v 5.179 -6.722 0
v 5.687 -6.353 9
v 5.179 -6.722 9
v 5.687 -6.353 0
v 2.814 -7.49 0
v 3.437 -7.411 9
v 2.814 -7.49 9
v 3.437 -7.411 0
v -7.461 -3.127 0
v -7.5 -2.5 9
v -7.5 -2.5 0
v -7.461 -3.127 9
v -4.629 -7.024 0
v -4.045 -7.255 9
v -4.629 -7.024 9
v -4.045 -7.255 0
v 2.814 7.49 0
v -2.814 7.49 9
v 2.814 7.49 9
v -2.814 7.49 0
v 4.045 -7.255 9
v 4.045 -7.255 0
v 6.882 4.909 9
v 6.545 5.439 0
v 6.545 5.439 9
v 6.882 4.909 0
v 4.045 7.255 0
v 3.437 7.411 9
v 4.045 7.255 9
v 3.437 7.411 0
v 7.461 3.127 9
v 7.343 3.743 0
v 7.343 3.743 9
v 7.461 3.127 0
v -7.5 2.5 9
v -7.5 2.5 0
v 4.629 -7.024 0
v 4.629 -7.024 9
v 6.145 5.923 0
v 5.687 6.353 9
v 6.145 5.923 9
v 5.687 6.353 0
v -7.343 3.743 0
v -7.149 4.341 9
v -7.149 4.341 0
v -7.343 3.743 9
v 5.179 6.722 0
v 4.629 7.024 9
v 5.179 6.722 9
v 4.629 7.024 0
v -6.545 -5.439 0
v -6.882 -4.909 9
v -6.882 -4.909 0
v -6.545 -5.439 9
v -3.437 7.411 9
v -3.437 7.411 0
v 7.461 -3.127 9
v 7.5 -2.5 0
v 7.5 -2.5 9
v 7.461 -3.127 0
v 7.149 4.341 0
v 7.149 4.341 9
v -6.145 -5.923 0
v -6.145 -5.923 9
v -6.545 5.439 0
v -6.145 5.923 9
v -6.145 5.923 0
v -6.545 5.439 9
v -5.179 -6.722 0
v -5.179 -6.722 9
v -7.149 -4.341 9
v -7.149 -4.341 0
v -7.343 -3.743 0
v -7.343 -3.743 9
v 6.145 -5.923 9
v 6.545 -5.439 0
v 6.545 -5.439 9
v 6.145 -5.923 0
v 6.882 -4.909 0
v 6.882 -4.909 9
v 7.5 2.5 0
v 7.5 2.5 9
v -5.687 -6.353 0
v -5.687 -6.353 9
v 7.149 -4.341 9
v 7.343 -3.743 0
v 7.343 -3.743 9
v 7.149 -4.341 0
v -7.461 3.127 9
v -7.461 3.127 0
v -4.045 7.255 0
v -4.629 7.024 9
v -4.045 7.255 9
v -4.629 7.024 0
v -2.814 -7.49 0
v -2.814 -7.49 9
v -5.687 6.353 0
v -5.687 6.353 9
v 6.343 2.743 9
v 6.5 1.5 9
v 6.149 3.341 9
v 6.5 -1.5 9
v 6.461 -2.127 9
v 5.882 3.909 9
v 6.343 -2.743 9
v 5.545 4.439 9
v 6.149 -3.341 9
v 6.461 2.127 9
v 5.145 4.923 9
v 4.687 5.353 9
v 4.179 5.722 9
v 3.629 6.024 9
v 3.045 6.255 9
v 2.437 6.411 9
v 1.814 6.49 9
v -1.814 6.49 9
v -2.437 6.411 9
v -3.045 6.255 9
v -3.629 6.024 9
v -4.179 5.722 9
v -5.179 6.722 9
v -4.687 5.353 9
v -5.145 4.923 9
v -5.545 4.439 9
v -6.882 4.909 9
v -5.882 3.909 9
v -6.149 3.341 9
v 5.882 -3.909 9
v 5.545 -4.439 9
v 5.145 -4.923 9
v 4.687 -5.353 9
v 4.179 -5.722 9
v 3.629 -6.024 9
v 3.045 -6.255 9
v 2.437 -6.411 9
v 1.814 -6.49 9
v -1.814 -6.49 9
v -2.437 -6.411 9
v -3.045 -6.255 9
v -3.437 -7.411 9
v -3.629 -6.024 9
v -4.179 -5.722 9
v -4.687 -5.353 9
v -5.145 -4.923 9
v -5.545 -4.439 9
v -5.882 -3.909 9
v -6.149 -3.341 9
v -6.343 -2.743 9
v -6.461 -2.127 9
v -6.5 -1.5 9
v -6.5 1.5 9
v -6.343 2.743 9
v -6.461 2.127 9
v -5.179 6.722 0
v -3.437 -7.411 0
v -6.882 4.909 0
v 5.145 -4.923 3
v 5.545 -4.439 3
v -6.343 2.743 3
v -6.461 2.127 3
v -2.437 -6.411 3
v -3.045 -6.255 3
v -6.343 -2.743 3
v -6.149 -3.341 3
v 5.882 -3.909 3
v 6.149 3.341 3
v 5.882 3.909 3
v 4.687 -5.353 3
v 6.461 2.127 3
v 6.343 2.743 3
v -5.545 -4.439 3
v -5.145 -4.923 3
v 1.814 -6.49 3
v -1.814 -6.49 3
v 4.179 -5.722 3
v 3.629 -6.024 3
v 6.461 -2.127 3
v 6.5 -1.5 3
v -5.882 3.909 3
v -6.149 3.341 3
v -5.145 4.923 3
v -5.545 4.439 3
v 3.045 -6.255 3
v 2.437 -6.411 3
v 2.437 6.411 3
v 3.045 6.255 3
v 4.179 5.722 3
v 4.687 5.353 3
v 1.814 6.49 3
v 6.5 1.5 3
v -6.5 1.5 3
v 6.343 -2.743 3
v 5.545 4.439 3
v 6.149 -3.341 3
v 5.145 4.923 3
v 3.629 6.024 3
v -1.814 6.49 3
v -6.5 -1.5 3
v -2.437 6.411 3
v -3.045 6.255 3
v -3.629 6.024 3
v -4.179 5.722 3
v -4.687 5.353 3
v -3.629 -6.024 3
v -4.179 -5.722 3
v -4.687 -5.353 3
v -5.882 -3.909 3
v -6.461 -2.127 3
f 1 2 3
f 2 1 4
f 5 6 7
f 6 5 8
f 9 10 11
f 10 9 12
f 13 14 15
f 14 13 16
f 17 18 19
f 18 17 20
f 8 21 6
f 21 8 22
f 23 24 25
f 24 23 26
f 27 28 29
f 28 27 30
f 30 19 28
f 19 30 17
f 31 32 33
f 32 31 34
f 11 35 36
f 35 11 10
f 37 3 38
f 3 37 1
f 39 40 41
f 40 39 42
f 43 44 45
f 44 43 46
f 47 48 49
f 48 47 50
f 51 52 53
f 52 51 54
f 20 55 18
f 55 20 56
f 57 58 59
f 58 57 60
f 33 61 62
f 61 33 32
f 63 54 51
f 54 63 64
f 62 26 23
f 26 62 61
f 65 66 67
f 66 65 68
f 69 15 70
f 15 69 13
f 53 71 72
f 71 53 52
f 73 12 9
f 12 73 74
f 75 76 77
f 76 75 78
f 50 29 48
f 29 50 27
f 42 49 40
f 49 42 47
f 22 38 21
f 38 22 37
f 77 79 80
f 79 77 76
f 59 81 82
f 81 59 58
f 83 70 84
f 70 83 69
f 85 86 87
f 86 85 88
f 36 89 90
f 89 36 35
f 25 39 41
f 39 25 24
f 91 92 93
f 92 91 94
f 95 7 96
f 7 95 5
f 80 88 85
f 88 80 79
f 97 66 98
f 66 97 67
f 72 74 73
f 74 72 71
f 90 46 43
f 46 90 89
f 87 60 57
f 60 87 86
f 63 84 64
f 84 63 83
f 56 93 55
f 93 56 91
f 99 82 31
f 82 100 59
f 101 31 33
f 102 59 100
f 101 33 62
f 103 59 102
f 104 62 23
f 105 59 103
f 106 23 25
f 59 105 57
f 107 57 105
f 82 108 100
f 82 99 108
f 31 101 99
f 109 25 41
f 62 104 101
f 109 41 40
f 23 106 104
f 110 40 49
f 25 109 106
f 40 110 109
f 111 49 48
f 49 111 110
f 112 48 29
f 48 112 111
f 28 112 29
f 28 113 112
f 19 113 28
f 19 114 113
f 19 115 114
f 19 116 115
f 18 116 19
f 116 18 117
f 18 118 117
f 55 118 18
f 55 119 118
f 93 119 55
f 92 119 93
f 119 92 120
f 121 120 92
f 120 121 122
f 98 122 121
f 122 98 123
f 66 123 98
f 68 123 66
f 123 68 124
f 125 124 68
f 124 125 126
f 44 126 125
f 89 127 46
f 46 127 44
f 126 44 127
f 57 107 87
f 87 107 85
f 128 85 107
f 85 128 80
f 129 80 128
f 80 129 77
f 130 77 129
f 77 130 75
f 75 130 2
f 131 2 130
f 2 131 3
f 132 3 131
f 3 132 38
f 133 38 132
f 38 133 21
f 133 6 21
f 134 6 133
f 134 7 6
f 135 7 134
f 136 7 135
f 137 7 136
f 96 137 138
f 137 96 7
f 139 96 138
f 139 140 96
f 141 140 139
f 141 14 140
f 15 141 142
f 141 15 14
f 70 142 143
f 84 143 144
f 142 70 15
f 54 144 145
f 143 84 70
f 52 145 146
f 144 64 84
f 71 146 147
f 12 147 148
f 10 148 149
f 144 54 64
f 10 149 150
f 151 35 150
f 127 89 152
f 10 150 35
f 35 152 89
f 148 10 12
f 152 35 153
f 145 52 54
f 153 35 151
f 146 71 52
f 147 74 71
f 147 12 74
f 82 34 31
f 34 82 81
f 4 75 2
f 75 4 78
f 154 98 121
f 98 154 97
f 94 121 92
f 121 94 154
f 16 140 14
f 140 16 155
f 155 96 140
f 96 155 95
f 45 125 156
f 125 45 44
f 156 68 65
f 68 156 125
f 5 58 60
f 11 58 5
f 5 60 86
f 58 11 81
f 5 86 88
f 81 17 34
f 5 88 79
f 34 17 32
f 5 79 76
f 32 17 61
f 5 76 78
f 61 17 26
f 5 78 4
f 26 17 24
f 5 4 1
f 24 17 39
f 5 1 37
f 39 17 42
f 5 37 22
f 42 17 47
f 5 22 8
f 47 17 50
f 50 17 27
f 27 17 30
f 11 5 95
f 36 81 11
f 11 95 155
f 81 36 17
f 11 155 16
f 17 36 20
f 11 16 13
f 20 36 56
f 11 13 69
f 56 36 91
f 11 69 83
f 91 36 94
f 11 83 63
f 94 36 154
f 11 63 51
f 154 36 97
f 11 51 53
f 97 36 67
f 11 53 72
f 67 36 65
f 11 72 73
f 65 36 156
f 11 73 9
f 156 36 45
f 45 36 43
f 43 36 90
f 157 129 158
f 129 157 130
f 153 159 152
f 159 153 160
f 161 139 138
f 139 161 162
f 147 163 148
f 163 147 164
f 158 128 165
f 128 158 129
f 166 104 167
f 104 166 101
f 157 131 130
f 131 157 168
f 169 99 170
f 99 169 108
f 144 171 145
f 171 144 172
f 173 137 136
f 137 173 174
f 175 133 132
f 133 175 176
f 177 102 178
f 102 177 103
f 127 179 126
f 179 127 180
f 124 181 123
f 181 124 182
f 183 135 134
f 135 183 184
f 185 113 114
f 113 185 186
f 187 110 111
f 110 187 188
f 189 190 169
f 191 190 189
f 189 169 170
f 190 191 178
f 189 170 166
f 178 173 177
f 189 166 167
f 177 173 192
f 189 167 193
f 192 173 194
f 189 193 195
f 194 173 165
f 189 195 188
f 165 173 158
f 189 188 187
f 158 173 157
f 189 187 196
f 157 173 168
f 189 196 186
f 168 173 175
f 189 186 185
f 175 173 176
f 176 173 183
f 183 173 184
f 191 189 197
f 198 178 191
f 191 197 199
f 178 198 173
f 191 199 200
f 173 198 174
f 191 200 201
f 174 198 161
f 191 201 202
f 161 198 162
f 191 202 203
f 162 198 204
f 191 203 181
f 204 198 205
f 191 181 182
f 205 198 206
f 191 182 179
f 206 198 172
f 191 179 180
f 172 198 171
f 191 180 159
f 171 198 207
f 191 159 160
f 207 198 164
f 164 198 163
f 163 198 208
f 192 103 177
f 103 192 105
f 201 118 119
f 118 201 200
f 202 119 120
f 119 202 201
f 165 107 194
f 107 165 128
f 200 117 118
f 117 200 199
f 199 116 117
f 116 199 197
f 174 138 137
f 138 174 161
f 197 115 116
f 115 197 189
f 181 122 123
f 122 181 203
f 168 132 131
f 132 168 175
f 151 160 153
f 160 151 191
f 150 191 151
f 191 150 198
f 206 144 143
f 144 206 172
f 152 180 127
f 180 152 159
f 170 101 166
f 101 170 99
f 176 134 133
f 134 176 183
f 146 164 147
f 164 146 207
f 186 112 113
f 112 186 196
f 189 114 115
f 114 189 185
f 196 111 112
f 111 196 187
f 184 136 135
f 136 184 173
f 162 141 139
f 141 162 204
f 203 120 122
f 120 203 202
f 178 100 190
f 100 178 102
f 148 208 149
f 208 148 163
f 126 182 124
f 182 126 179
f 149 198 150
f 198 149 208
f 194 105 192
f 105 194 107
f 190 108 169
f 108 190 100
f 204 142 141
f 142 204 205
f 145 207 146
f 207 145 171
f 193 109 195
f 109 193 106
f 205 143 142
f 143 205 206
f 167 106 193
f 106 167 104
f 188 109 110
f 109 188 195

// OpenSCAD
$fn = 50;


difference() {
	union() {
		hull() {
			translate(v = [-2.5000000000, 2.5000000000, 0]) {
				cylinder(h = 9, r = 5);
			}
			translate(v = [2.5000000000, 2.5000000000, 0]) {
				cylinder(h = 9, r = 5);
			}
			translate(v = [-2.5000000000, -2.5000000000, 0]) {
				cylinder(h = 9, r = 5);
			}
			translate(v = [2.5000000000, -2.5000000000, 0]) {
				cylinder(h = 9, r = 5);
			}
		}
	}
	union() {
		translate(v = [0, 0, 3]) {
			#hull() {
				translate(v = [-1.5000000000, 1.5000000000, 0]) {
					cylinder(h = 6, r = 5);
				}
				translate(v = [1.5000000000, 1.5000000000, 0]) {
					cylinder(h = 6, r = 5);
				}
				translate(v = [-1.5000000000, -1.5000000000, 0]) {
					cylinder(h = 6, r = 5);
				}
				translate(v = [1.5000000000, -1.5000000000, 0]) {
					cylinder(h = 6, r = 5);
				}
			}
		}
	}
}
